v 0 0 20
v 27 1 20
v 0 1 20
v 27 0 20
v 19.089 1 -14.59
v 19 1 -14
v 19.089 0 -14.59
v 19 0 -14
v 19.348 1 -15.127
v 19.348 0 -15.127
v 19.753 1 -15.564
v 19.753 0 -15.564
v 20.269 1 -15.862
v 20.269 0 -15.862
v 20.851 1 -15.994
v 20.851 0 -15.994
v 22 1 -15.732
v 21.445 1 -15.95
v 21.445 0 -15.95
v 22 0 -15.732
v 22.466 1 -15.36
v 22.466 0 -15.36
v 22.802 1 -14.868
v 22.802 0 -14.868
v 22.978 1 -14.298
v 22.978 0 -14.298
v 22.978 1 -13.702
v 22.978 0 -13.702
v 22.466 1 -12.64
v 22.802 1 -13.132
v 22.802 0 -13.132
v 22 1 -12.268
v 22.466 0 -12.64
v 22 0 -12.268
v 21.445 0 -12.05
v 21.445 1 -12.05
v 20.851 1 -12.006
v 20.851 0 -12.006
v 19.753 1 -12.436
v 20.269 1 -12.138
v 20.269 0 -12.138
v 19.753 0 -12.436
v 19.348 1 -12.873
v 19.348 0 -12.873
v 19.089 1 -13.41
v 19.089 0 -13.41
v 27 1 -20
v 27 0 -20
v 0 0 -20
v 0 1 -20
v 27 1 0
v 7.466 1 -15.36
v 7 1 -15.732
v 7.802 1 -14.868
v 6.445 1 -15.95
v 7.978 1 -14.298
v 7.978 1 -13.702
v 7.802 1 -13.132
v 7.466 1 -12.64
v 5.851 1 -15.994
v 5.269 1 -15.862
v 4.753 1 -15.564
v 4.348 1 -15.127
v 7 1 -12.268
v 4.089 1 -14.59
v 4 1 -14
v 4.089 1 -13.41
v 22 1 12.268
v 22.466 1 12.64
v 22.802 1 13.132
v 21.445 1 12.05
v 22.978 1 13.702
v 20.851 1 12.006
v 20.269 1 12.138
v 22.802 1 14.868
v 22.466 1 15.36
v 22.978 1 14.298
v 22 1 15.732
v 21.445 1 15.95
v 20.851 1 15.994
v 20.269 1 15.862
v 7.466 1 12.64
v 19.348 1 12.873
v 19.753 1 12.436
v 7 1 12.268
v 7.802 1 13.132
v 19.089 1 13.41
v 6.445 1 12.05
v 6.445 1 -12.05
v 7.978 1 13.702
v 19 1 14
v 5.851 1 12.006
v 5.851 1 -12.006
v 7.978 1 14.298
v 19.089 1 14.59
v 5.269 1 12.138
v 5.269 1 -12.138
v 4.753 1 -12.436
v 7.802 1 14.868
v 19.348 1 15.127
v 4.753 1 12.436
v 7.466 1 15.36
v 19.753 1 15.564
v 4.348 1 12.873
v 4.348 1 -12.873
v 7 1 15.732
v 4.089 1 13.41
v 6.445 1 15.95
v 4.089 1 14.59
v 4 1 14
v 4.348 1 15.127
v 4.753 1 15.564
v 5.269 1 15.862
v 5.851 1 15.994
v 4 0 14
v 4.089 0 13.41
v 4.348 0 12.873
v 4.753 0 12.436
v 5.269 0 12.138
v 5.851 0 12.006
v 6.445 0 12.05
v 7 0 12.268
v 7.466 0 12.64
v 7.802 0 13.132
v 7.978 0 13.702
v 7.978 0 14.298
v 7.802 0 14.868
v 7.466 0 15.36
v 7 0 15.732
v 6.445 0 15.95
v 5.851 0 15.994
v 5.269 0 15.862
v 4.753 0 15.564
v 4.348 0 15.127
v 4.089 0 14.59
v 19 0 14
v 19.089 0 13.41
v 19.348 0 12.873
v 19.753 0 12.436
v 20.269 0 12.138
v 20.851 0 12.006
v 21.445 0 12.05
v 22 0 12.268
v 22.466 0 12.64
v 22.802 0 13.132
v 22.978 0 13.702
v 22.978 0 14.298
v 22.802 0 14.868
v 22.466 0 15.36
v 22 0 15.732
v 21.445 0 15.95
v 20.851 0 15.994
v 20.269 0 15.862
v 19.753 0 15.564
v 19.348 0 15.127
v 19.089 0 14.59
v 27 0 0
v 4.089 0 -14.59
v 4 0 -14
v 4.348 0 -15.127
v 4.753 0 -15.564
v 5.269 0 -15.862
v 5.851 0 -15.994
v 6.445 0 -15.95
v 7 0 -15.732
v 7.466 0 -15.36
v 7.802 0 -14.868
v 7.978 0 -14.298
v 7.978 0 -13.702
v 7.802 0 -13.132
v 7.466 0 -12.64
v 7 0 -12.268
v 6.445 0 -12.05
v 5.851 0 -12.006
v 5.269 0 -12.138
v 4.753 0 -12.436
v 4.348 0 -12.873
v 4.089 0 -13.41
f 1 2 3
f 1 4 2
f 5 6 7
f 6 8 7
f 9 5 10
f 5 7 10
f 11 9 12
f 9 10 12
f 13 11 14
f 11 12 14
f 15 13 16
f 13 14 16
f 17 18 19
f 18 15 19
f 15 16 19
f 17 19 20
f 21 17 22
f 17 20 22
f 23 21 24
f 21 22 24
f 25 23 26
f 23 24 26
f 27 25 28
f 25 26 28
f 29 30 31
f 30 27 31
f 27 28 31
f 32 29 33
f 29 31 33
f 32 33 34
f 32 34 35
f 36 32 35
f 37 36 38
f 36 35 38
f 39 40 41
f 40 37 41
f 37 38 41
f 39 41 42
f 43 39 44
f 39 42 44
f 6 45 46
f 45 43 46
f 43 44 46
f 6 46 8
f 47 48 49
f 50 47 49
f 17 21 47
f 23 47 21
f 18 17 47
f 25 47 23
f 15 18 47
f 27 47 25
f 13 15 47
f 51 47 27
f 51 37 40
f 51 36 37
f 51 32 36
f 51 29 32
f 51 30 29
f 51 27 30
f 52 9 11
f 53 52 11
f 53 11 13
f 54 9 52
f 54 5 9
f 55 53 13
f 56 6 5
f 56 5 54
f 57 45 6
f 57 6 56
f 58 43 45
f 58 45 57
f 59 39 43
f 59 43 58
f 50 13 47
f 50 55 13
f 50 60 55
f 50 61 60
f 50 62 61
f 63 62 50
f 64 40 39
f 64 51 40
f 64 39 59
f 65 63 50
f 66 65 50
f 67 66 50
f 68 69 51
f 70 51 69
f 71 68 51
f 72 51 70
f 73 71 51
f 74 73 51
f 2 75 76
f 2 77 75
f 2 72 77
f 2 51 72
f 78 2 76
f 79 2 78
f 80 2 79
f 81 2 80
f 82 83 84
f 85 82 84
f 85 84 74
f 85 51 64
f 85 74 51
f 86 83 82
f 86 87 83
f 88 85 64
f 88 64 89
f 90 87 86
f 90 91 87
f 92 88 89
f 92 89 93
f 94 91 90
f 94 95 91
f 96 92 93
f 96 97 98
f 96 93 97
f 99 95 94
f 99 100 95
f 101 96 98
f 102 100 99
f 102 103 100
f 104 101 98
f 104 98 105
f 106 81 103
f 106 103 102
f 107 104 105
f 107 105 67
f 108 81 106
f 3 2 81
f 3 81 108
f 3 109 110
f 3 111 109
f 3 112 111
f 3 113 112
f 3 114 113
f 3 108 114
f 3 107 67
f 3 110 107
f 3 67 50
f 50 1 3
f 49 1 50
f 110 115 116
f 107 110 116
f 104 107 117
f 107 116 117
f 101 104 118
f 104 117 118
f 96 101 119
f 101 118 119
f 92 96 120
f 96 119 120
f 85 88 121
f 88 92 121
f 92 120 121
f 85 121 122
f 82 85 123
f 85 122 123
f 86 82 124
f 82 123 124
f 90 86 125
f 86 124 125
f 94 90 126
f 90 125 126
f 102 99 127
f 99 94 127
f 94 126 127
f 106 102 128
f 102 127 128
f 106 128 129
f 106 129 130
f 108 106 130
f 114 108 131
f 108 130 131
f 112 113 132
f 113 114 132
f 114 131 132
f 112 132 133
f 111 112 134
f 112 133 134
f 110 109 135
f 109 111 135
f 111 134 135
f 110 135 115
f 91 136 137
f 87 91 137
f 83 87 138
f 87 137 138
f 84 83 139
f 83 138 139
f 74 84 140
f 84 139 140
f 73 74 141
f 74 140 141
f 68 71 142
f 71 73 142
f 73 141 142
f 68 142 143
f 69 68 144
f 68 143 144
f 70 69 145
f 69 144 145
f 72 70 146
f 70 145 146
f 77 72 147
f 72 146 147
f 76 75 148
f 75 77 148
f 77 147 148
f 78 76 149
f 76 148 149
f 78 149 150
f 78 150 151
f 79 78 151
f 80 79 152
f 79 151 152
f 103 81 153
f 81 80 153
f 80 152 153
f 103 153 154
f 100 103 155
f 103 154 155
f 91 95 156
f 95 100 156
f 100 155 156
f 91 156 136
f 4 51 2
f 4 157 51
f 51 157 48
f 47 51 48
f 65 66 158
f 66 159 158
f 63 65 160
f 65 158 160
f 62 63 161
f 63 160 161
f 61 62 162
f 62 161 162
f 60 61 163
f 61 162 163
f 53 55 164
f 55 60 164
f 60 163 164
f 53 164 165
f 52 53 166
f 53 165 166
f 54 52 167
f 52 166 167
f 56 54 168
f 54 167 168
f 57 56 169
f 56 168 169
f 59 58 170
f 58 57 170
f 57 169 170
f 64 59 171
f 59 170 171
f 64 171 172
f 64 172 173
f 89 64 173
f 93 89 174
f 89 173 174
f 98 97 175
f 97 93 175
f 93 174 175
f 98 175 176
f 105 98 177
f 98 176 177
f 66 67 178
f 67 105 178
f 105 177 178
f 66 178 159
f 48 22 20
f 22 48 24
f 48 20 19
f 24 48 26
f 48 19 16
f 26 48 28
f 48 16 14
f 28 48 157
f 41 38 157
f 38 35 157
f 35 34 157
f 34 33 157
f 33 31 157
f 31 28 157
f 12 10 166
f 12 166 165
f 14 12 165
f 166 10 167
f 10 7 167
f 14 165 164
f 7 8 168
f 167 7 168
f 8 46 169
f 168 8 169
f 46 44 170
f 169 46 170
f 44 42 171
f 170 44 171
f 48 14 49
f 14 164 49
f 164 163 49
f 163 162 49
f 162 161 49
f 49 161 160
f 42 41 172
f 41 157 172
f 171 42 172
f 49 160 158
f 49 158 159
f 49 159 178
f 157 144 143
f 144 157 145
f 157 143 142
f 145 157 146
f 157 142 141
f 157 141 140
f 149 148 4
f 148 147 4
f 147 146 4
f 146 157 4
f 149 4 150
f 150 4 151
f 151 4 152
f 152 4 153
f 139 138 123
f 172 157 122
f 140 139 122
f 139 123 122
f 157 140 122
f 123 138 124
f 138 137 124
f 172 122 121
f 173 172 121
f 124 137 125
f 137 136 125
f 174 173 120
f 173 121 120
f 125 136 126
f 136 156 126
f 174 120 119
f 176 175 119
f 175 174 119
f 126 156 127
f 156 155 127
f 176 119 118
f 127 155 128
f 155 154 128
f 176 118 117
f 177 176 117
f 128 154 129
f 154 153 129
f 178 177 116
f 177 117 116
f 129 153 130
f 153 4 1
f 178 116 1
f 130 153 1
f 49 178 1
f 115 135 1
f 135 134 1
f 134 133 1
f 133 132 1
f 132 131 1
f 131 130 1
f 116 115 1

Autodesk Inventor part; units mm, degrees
ref_plane "YZ Plane" through (0, 0, 0) normal (1, 0, 0) x (0, 1, 0)
ref_plane "XZ Plane" through (0, 0, 0) normal (0, 1, 0) x (-1, 0, 0)
ref_plane "XY Plane" through (0, 0, 0) normal (0, 0, 1) x (1, 0, 0)
sketch "Sketch1" plane through (0, 0, 0) normal (0, 1, 0) x (-1, 0, 0)
  line L0 (-27, 20) -> (0, 20)
  line L1 (0, 20) -> (0, 0) construction
  line L2 (0, 0) -> (-27, 0) construction
  line L3 (-27, 0) -> (-27, 20)
  line L4 (-37.8717, 14) -> (4.6091, 14) construction
  circle A0 centre (-6, 14) radius 2
  circle A1 centre (-21, 14) radius 2
  line L5 (-27, -20) -> (0, -20)
  line L6 (0, -20) -> (0, 0) construction
  line L7 (-27, 0) -> (-27, -20)
  line L8 (-37.8717, -14) -> (4.6091, -14) construction
  circle A2 centre (-6, -14) radius 2
  circle A3 centre (-21, -14) radius 2
  line L9 (0, 20) -> (0, -20)
  dimension "d1" = 20
  dimension "d2" = 6
  dimension "d3" = 4
  dimension "d4" = 6
  dimension "d5" = 21
  dimension "d7" = 6
extrude "Plate1" add sketch "Sketch1" along normal blind 1
equation "\"BendRadius\" = Thickness"
equation "\"BendReliefWidth\" = Thickness"
equation "\"BendReliefDepth\" = 0.5 * Thickness"
equation "\"CornerReliefSize\" = 4 * Thickness"
equation "\"MinimumRemnant\" = 2 * Thickness"
equation "\"TransitionRadius\" = BendRadius"
equation "\"JacobiRadiusSize\" = BendRadius"
equation "\"GapSize\" = Thickness"
equation "\"d6\" = BendRadius"
equation "\"Thickness\" = 1"
properties part number "BracketHalf" material "Steel, Galvanized"
